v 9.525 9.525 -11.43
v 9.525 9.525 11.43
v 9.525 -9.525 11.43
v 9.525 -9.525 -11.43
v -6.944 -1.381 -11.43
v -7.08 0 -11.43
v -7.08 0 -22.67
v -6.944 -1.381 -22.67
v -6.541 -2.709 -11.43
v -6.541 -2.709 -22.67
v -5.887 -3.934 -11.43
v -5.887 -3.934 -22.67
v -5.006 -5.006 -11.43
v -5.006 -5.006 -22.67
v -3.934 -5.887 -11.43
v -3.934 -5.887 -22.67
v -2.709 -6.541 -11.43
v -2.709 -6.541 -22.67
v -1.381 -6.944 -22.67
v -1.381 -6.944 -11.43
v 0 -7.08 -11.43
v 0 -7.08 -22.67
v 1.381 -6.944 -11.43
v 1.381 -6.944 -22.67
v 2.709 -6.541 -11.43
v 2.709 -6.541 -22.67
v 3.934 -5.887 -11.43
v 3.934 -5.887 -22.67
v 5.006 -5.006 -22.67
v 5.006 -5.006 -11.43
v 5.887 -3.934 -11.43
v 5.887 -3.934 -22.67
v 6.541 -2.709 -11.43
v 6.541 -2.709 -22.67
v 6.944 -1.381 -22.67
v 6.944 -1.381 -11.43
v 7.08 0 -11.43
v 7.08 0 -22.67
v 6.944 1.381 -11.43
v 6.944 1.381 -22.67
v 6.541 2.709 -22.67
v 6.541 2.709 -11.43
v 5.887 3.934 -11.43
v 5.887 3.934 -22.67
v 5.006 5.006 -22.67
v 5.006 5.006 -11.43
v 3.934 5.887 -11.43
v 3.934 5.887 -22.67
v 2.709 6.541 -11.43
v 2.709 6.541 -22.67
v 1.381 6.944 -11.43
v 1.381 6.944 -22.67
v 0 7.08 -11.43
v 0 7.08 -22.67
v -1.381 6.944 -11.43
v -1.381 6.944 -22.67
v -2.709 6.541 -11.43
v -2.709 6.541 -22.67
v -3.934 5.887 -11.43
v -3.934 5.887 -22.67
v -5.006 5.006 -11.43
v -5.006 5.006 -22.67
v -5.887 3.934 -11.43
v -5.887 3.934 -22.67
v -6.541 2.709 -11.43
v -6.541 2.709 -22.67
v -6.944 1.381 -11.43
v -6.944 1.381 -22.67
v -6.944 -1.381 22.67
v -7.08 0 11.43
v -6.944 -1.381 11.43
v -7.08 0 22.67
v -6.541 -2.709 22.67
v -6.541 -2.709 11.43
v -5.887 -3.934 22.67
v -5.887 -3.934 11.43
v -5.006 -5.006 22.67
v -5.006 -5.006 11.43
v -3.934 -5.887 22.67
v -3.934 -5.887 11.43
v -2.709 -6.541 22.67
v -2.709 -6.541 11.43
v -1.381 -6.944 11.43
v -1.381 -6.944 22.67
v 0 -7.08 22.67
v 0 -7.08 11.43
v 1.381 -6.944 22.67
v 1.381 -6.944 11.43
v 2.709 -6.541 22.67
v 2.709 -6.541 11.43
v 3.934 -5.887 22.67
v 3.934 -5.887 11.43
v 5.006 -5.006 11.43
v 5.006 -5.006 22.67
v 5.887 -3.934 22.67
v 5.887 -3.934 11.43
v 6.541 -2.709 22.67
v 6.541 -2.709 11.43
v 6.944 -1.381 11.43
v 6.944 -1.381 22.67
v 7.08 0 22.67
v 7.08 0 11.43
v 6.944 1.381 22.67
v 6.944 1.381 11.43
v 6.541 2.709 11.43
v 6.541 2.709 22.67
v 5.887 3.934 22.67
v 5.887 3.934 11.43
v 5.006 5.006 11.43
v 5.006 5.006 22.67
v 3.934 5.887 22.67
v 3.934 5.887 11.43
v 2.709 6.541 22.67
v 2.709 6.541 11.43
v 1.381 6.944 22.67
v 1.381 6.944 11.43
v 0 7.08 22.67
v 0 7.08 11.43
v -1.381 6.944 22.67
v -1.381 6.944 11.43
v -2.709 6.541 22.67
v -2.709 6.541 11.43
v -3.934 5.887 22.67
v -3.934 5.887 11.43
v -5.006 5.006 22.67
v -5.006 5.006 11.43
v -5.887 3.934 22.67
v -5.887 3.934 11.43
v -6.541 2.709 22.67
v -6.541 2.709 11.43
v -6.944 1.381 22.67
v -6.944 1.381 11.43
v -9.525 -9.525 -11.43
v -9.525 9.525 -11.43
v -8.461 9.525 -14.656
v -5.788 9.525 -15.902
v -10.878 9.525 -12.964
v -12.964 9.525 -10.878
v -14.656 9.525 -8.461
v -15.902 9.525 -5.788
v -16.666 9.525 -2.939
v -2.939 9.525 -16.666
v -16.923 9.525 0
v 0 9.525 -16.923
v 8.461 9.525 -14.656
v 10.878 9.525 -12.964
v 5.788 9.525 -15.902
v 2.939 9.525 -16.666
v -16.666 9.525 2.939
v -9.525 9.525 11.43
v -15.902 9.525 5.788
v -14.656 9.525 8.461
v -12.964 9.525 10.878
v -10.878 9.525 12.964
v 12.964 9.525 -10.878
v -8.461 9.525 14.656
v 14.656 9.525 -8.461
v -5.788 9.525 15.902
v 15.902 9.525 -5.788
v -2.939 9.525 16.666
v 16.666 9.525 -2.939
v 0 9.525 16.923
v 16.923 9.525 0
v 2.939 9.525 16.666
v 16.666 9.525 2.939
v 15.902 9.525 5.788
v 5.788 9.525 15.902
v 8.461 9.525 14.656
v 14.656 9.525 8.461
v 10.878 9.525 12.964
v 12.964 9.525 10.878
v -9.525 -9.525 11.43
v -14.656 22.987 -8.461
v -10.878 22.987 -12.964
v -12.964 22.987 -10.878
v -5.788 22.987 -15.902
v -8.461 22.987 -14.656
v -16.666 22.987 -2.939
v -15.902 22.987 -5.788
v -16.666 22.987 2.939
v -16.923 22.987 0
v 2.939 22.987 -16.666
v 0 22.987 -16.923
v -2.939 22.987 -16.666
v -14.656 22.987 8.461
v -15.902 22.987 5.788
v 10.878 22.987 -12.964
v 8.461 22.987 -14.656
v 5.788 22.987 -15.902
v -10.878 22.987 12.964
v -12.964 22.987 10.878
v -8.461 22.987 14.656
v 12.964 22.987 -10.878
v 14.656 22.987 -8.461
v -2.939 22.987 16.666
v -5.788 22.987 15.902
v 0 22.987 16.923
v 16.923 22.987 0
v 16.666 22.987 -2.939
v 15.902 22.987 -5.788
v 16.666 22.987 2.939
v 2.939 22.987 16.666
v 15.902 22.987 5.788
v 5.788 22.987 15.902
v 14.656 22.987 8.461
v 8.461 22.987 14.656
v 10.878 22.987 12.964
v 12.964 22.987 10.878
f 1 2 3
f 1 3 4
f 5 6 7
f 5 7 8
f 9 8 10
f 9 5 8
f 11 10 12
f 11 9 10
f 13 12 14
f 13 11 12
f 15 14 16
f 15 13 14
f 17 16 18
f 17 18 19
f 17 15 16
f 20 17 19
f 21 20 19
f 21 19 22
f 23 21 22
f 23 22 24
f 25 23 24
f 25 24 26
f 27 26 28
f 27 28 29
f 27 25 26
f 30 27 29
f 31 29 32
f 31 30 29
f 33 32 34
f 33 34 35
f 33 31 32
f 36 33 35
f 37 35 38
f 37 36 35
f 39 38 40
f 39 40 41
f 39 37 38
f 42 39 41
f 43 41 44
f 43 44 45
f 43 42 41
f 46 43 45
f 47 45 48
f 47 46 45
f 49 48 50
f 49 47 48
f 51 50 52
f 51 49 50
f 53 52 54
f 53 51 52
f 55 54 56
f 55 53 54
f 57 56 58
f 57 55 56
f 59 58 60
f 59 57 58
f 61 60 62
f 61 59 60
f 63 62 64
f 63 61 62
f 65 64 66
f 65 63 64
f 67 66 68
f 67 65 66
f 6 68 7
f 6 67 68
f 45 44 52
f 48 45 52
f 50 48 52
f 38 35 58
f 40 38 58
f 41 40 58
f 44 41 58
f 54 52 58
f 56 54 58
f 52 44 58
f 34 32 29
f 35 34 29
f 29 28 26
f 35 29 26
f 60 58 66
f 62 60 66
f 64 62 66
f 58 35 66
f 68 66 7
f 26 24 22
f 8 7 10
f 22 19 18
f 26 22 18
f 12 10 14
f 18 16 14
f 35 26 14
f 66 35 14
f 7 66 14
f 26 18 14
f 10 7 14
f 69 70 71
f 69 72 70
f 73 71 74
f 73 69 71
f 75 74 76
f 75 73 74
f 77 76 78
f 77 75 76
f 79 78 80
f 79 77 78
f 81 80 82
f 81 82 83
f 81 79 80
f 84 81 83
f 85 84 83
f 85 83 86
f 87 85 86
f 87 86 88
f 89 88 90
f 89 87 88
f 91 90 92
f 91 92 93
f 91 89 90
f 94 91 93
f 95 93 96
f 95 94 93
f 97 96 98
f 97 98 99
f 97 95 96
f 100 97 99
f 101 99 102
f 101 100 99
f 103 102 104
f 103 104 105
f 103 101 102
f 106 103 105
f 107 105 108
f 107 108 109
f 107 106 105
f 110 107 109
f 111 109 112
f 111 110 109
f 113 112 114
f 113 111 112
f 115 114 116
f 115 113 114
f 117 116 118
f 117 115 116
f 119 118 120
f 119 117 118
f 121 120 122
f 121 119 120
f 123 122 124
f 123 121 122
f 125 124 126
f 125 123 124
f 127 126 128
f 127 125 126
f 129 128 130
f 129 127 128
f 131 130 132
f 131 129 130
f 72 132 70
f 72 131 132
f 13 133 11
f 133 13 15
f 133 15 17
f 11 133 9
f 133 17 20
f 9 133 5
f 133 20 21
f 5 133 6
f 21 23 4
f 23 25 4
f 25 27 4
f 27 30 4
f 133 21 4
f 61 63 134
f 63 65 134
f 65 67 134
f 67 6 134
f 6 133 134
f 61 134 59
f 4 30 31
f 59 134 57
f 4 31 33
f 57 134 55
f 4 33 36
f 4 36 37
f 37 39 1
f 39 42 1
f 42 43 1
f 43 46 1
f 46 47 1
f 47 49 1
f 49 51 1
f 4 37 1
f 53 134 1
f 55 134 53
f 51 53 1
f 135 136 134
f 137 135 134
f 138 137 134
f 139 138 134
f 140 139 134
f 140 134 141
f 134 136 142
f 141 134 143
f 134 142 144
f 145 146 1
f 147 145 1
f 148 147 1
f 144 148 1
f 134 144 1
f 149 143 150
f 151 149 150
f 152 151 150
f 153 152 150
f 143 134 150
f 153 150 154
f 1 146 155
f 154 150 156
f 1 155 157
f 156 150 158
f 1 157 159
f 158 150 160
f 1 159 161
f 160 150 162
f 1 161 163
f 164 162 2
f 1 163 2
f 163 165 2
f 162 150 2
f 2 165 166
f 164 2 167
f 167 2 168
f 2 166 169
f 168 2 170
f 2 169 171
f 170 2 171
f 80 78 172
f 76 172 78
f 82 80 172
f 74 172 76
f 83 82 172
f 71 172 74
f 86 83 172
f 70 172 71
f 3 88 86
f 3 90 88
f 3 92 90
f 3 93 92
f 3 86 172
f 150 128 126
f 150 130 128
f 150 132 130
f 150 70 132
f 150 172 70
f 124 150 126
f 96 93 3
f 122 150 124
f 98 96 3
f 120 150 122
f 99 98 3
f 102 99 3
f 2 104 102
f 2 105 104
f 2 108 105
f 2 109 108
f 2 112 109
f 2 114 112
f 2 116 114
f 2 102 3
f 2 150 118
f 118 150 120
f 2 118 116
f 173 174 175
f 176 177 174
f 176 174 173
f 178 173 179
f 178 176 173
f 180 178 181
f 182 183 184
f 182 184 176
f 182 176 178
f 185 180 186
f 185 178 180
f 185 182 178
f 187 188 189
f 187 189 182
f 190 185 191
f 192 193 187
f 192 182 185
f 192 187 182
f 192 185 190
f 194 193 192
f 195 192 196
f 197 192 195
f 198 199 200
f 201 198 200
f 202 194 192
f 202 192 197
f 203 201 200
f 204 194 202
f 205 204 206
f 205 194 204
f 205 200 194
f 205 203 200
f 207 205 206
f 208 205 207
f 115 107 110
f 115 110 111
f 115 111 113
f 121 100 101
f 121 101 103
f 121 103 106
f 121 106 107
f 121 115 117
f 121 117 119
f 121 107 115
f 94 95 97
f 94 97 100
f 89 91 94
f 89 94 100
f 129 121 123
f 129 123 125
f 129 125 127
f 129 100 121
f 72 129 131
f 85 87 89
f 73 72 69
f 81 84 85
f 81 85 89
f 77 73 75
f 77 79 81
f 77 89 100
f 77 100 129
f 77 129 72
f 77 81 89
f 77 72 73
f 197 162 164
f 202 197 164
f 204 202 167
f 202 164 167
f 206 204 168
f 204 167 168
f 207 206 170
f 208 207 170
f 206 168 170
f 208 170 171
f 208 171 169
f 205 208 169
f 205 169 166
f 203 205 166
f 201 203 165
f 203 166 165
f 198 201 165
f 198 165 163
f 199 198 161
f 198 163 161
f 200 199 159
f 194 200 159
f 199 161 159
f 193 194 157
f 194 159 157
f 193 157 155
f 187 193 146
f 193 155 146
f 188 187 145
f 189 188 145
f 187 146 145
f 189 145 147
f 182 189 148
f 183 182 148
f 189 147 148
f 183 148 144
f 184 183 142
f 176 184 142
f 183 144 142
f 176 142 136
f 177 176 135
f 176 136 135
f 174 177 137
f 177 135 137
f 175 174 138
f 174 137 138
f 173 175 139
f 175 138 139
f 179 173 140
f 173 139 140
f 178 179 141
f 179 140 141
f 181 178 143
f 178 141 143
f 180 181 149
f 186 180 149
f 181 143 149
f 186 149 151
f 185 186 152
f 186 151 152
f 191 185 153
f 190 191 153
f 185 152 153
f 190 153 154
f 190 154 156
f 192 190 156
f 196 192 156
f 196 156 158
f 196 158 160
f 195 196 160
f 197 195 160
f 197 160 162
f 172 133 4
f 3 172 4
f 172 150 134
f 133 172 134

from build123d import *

# Parameters (mm, degrees)
SKETCH1_W           = 19.05
SKETCH1_H           = 22.86
BOSS_EXTRUDE1_DEPTH = 9.525
SKETCH2_R           = 16.92275
BOSS_EXTRUDE2_DEPTH = 13.462
SKETCH4_R           = 7.08025
BOSS_EXTRUDE4_DEPTH = 22.6695


with BuildPart() as part:
    # Sketch1 → Boss-Extrude1 (new, symmetric)
    with BuildSketch(Plane(origin=(0, 0, 0), x_dir=(1, 0, 0), z_dir=(0, 1, 0))):
        Rectangle(SKETCH1_W, SKETCH1_H)
    extrude(amount=BOSS_EXTRUDE1_DEPTH, both=True)

    # Sketch2 → Boss-Extrude2 (add)
    with BuildSketch(Plane(origin=(0, 9.525, 0), x_dir=(1, 0, 0), z_dir=(0, 1, 0))):
        with Locations(Location((0, 0, 0), (0, 0, 270))):
            Circle(SKETCH2_R)
    extrude(amount=BOSS_EXTRUDE2_DEPTH)

    # Sketch4 → Boss-Extrude4 (add, symmetric)
    with BuildSketch(Plane.XY):
        with Locations(Location((0, 0, 0), (0, 0, 180))):
            Circle(SKETCH4_R)
    extrude(amount=BOSS_EXTRUDE4_DEPTH, both=True)


solid = part.part
